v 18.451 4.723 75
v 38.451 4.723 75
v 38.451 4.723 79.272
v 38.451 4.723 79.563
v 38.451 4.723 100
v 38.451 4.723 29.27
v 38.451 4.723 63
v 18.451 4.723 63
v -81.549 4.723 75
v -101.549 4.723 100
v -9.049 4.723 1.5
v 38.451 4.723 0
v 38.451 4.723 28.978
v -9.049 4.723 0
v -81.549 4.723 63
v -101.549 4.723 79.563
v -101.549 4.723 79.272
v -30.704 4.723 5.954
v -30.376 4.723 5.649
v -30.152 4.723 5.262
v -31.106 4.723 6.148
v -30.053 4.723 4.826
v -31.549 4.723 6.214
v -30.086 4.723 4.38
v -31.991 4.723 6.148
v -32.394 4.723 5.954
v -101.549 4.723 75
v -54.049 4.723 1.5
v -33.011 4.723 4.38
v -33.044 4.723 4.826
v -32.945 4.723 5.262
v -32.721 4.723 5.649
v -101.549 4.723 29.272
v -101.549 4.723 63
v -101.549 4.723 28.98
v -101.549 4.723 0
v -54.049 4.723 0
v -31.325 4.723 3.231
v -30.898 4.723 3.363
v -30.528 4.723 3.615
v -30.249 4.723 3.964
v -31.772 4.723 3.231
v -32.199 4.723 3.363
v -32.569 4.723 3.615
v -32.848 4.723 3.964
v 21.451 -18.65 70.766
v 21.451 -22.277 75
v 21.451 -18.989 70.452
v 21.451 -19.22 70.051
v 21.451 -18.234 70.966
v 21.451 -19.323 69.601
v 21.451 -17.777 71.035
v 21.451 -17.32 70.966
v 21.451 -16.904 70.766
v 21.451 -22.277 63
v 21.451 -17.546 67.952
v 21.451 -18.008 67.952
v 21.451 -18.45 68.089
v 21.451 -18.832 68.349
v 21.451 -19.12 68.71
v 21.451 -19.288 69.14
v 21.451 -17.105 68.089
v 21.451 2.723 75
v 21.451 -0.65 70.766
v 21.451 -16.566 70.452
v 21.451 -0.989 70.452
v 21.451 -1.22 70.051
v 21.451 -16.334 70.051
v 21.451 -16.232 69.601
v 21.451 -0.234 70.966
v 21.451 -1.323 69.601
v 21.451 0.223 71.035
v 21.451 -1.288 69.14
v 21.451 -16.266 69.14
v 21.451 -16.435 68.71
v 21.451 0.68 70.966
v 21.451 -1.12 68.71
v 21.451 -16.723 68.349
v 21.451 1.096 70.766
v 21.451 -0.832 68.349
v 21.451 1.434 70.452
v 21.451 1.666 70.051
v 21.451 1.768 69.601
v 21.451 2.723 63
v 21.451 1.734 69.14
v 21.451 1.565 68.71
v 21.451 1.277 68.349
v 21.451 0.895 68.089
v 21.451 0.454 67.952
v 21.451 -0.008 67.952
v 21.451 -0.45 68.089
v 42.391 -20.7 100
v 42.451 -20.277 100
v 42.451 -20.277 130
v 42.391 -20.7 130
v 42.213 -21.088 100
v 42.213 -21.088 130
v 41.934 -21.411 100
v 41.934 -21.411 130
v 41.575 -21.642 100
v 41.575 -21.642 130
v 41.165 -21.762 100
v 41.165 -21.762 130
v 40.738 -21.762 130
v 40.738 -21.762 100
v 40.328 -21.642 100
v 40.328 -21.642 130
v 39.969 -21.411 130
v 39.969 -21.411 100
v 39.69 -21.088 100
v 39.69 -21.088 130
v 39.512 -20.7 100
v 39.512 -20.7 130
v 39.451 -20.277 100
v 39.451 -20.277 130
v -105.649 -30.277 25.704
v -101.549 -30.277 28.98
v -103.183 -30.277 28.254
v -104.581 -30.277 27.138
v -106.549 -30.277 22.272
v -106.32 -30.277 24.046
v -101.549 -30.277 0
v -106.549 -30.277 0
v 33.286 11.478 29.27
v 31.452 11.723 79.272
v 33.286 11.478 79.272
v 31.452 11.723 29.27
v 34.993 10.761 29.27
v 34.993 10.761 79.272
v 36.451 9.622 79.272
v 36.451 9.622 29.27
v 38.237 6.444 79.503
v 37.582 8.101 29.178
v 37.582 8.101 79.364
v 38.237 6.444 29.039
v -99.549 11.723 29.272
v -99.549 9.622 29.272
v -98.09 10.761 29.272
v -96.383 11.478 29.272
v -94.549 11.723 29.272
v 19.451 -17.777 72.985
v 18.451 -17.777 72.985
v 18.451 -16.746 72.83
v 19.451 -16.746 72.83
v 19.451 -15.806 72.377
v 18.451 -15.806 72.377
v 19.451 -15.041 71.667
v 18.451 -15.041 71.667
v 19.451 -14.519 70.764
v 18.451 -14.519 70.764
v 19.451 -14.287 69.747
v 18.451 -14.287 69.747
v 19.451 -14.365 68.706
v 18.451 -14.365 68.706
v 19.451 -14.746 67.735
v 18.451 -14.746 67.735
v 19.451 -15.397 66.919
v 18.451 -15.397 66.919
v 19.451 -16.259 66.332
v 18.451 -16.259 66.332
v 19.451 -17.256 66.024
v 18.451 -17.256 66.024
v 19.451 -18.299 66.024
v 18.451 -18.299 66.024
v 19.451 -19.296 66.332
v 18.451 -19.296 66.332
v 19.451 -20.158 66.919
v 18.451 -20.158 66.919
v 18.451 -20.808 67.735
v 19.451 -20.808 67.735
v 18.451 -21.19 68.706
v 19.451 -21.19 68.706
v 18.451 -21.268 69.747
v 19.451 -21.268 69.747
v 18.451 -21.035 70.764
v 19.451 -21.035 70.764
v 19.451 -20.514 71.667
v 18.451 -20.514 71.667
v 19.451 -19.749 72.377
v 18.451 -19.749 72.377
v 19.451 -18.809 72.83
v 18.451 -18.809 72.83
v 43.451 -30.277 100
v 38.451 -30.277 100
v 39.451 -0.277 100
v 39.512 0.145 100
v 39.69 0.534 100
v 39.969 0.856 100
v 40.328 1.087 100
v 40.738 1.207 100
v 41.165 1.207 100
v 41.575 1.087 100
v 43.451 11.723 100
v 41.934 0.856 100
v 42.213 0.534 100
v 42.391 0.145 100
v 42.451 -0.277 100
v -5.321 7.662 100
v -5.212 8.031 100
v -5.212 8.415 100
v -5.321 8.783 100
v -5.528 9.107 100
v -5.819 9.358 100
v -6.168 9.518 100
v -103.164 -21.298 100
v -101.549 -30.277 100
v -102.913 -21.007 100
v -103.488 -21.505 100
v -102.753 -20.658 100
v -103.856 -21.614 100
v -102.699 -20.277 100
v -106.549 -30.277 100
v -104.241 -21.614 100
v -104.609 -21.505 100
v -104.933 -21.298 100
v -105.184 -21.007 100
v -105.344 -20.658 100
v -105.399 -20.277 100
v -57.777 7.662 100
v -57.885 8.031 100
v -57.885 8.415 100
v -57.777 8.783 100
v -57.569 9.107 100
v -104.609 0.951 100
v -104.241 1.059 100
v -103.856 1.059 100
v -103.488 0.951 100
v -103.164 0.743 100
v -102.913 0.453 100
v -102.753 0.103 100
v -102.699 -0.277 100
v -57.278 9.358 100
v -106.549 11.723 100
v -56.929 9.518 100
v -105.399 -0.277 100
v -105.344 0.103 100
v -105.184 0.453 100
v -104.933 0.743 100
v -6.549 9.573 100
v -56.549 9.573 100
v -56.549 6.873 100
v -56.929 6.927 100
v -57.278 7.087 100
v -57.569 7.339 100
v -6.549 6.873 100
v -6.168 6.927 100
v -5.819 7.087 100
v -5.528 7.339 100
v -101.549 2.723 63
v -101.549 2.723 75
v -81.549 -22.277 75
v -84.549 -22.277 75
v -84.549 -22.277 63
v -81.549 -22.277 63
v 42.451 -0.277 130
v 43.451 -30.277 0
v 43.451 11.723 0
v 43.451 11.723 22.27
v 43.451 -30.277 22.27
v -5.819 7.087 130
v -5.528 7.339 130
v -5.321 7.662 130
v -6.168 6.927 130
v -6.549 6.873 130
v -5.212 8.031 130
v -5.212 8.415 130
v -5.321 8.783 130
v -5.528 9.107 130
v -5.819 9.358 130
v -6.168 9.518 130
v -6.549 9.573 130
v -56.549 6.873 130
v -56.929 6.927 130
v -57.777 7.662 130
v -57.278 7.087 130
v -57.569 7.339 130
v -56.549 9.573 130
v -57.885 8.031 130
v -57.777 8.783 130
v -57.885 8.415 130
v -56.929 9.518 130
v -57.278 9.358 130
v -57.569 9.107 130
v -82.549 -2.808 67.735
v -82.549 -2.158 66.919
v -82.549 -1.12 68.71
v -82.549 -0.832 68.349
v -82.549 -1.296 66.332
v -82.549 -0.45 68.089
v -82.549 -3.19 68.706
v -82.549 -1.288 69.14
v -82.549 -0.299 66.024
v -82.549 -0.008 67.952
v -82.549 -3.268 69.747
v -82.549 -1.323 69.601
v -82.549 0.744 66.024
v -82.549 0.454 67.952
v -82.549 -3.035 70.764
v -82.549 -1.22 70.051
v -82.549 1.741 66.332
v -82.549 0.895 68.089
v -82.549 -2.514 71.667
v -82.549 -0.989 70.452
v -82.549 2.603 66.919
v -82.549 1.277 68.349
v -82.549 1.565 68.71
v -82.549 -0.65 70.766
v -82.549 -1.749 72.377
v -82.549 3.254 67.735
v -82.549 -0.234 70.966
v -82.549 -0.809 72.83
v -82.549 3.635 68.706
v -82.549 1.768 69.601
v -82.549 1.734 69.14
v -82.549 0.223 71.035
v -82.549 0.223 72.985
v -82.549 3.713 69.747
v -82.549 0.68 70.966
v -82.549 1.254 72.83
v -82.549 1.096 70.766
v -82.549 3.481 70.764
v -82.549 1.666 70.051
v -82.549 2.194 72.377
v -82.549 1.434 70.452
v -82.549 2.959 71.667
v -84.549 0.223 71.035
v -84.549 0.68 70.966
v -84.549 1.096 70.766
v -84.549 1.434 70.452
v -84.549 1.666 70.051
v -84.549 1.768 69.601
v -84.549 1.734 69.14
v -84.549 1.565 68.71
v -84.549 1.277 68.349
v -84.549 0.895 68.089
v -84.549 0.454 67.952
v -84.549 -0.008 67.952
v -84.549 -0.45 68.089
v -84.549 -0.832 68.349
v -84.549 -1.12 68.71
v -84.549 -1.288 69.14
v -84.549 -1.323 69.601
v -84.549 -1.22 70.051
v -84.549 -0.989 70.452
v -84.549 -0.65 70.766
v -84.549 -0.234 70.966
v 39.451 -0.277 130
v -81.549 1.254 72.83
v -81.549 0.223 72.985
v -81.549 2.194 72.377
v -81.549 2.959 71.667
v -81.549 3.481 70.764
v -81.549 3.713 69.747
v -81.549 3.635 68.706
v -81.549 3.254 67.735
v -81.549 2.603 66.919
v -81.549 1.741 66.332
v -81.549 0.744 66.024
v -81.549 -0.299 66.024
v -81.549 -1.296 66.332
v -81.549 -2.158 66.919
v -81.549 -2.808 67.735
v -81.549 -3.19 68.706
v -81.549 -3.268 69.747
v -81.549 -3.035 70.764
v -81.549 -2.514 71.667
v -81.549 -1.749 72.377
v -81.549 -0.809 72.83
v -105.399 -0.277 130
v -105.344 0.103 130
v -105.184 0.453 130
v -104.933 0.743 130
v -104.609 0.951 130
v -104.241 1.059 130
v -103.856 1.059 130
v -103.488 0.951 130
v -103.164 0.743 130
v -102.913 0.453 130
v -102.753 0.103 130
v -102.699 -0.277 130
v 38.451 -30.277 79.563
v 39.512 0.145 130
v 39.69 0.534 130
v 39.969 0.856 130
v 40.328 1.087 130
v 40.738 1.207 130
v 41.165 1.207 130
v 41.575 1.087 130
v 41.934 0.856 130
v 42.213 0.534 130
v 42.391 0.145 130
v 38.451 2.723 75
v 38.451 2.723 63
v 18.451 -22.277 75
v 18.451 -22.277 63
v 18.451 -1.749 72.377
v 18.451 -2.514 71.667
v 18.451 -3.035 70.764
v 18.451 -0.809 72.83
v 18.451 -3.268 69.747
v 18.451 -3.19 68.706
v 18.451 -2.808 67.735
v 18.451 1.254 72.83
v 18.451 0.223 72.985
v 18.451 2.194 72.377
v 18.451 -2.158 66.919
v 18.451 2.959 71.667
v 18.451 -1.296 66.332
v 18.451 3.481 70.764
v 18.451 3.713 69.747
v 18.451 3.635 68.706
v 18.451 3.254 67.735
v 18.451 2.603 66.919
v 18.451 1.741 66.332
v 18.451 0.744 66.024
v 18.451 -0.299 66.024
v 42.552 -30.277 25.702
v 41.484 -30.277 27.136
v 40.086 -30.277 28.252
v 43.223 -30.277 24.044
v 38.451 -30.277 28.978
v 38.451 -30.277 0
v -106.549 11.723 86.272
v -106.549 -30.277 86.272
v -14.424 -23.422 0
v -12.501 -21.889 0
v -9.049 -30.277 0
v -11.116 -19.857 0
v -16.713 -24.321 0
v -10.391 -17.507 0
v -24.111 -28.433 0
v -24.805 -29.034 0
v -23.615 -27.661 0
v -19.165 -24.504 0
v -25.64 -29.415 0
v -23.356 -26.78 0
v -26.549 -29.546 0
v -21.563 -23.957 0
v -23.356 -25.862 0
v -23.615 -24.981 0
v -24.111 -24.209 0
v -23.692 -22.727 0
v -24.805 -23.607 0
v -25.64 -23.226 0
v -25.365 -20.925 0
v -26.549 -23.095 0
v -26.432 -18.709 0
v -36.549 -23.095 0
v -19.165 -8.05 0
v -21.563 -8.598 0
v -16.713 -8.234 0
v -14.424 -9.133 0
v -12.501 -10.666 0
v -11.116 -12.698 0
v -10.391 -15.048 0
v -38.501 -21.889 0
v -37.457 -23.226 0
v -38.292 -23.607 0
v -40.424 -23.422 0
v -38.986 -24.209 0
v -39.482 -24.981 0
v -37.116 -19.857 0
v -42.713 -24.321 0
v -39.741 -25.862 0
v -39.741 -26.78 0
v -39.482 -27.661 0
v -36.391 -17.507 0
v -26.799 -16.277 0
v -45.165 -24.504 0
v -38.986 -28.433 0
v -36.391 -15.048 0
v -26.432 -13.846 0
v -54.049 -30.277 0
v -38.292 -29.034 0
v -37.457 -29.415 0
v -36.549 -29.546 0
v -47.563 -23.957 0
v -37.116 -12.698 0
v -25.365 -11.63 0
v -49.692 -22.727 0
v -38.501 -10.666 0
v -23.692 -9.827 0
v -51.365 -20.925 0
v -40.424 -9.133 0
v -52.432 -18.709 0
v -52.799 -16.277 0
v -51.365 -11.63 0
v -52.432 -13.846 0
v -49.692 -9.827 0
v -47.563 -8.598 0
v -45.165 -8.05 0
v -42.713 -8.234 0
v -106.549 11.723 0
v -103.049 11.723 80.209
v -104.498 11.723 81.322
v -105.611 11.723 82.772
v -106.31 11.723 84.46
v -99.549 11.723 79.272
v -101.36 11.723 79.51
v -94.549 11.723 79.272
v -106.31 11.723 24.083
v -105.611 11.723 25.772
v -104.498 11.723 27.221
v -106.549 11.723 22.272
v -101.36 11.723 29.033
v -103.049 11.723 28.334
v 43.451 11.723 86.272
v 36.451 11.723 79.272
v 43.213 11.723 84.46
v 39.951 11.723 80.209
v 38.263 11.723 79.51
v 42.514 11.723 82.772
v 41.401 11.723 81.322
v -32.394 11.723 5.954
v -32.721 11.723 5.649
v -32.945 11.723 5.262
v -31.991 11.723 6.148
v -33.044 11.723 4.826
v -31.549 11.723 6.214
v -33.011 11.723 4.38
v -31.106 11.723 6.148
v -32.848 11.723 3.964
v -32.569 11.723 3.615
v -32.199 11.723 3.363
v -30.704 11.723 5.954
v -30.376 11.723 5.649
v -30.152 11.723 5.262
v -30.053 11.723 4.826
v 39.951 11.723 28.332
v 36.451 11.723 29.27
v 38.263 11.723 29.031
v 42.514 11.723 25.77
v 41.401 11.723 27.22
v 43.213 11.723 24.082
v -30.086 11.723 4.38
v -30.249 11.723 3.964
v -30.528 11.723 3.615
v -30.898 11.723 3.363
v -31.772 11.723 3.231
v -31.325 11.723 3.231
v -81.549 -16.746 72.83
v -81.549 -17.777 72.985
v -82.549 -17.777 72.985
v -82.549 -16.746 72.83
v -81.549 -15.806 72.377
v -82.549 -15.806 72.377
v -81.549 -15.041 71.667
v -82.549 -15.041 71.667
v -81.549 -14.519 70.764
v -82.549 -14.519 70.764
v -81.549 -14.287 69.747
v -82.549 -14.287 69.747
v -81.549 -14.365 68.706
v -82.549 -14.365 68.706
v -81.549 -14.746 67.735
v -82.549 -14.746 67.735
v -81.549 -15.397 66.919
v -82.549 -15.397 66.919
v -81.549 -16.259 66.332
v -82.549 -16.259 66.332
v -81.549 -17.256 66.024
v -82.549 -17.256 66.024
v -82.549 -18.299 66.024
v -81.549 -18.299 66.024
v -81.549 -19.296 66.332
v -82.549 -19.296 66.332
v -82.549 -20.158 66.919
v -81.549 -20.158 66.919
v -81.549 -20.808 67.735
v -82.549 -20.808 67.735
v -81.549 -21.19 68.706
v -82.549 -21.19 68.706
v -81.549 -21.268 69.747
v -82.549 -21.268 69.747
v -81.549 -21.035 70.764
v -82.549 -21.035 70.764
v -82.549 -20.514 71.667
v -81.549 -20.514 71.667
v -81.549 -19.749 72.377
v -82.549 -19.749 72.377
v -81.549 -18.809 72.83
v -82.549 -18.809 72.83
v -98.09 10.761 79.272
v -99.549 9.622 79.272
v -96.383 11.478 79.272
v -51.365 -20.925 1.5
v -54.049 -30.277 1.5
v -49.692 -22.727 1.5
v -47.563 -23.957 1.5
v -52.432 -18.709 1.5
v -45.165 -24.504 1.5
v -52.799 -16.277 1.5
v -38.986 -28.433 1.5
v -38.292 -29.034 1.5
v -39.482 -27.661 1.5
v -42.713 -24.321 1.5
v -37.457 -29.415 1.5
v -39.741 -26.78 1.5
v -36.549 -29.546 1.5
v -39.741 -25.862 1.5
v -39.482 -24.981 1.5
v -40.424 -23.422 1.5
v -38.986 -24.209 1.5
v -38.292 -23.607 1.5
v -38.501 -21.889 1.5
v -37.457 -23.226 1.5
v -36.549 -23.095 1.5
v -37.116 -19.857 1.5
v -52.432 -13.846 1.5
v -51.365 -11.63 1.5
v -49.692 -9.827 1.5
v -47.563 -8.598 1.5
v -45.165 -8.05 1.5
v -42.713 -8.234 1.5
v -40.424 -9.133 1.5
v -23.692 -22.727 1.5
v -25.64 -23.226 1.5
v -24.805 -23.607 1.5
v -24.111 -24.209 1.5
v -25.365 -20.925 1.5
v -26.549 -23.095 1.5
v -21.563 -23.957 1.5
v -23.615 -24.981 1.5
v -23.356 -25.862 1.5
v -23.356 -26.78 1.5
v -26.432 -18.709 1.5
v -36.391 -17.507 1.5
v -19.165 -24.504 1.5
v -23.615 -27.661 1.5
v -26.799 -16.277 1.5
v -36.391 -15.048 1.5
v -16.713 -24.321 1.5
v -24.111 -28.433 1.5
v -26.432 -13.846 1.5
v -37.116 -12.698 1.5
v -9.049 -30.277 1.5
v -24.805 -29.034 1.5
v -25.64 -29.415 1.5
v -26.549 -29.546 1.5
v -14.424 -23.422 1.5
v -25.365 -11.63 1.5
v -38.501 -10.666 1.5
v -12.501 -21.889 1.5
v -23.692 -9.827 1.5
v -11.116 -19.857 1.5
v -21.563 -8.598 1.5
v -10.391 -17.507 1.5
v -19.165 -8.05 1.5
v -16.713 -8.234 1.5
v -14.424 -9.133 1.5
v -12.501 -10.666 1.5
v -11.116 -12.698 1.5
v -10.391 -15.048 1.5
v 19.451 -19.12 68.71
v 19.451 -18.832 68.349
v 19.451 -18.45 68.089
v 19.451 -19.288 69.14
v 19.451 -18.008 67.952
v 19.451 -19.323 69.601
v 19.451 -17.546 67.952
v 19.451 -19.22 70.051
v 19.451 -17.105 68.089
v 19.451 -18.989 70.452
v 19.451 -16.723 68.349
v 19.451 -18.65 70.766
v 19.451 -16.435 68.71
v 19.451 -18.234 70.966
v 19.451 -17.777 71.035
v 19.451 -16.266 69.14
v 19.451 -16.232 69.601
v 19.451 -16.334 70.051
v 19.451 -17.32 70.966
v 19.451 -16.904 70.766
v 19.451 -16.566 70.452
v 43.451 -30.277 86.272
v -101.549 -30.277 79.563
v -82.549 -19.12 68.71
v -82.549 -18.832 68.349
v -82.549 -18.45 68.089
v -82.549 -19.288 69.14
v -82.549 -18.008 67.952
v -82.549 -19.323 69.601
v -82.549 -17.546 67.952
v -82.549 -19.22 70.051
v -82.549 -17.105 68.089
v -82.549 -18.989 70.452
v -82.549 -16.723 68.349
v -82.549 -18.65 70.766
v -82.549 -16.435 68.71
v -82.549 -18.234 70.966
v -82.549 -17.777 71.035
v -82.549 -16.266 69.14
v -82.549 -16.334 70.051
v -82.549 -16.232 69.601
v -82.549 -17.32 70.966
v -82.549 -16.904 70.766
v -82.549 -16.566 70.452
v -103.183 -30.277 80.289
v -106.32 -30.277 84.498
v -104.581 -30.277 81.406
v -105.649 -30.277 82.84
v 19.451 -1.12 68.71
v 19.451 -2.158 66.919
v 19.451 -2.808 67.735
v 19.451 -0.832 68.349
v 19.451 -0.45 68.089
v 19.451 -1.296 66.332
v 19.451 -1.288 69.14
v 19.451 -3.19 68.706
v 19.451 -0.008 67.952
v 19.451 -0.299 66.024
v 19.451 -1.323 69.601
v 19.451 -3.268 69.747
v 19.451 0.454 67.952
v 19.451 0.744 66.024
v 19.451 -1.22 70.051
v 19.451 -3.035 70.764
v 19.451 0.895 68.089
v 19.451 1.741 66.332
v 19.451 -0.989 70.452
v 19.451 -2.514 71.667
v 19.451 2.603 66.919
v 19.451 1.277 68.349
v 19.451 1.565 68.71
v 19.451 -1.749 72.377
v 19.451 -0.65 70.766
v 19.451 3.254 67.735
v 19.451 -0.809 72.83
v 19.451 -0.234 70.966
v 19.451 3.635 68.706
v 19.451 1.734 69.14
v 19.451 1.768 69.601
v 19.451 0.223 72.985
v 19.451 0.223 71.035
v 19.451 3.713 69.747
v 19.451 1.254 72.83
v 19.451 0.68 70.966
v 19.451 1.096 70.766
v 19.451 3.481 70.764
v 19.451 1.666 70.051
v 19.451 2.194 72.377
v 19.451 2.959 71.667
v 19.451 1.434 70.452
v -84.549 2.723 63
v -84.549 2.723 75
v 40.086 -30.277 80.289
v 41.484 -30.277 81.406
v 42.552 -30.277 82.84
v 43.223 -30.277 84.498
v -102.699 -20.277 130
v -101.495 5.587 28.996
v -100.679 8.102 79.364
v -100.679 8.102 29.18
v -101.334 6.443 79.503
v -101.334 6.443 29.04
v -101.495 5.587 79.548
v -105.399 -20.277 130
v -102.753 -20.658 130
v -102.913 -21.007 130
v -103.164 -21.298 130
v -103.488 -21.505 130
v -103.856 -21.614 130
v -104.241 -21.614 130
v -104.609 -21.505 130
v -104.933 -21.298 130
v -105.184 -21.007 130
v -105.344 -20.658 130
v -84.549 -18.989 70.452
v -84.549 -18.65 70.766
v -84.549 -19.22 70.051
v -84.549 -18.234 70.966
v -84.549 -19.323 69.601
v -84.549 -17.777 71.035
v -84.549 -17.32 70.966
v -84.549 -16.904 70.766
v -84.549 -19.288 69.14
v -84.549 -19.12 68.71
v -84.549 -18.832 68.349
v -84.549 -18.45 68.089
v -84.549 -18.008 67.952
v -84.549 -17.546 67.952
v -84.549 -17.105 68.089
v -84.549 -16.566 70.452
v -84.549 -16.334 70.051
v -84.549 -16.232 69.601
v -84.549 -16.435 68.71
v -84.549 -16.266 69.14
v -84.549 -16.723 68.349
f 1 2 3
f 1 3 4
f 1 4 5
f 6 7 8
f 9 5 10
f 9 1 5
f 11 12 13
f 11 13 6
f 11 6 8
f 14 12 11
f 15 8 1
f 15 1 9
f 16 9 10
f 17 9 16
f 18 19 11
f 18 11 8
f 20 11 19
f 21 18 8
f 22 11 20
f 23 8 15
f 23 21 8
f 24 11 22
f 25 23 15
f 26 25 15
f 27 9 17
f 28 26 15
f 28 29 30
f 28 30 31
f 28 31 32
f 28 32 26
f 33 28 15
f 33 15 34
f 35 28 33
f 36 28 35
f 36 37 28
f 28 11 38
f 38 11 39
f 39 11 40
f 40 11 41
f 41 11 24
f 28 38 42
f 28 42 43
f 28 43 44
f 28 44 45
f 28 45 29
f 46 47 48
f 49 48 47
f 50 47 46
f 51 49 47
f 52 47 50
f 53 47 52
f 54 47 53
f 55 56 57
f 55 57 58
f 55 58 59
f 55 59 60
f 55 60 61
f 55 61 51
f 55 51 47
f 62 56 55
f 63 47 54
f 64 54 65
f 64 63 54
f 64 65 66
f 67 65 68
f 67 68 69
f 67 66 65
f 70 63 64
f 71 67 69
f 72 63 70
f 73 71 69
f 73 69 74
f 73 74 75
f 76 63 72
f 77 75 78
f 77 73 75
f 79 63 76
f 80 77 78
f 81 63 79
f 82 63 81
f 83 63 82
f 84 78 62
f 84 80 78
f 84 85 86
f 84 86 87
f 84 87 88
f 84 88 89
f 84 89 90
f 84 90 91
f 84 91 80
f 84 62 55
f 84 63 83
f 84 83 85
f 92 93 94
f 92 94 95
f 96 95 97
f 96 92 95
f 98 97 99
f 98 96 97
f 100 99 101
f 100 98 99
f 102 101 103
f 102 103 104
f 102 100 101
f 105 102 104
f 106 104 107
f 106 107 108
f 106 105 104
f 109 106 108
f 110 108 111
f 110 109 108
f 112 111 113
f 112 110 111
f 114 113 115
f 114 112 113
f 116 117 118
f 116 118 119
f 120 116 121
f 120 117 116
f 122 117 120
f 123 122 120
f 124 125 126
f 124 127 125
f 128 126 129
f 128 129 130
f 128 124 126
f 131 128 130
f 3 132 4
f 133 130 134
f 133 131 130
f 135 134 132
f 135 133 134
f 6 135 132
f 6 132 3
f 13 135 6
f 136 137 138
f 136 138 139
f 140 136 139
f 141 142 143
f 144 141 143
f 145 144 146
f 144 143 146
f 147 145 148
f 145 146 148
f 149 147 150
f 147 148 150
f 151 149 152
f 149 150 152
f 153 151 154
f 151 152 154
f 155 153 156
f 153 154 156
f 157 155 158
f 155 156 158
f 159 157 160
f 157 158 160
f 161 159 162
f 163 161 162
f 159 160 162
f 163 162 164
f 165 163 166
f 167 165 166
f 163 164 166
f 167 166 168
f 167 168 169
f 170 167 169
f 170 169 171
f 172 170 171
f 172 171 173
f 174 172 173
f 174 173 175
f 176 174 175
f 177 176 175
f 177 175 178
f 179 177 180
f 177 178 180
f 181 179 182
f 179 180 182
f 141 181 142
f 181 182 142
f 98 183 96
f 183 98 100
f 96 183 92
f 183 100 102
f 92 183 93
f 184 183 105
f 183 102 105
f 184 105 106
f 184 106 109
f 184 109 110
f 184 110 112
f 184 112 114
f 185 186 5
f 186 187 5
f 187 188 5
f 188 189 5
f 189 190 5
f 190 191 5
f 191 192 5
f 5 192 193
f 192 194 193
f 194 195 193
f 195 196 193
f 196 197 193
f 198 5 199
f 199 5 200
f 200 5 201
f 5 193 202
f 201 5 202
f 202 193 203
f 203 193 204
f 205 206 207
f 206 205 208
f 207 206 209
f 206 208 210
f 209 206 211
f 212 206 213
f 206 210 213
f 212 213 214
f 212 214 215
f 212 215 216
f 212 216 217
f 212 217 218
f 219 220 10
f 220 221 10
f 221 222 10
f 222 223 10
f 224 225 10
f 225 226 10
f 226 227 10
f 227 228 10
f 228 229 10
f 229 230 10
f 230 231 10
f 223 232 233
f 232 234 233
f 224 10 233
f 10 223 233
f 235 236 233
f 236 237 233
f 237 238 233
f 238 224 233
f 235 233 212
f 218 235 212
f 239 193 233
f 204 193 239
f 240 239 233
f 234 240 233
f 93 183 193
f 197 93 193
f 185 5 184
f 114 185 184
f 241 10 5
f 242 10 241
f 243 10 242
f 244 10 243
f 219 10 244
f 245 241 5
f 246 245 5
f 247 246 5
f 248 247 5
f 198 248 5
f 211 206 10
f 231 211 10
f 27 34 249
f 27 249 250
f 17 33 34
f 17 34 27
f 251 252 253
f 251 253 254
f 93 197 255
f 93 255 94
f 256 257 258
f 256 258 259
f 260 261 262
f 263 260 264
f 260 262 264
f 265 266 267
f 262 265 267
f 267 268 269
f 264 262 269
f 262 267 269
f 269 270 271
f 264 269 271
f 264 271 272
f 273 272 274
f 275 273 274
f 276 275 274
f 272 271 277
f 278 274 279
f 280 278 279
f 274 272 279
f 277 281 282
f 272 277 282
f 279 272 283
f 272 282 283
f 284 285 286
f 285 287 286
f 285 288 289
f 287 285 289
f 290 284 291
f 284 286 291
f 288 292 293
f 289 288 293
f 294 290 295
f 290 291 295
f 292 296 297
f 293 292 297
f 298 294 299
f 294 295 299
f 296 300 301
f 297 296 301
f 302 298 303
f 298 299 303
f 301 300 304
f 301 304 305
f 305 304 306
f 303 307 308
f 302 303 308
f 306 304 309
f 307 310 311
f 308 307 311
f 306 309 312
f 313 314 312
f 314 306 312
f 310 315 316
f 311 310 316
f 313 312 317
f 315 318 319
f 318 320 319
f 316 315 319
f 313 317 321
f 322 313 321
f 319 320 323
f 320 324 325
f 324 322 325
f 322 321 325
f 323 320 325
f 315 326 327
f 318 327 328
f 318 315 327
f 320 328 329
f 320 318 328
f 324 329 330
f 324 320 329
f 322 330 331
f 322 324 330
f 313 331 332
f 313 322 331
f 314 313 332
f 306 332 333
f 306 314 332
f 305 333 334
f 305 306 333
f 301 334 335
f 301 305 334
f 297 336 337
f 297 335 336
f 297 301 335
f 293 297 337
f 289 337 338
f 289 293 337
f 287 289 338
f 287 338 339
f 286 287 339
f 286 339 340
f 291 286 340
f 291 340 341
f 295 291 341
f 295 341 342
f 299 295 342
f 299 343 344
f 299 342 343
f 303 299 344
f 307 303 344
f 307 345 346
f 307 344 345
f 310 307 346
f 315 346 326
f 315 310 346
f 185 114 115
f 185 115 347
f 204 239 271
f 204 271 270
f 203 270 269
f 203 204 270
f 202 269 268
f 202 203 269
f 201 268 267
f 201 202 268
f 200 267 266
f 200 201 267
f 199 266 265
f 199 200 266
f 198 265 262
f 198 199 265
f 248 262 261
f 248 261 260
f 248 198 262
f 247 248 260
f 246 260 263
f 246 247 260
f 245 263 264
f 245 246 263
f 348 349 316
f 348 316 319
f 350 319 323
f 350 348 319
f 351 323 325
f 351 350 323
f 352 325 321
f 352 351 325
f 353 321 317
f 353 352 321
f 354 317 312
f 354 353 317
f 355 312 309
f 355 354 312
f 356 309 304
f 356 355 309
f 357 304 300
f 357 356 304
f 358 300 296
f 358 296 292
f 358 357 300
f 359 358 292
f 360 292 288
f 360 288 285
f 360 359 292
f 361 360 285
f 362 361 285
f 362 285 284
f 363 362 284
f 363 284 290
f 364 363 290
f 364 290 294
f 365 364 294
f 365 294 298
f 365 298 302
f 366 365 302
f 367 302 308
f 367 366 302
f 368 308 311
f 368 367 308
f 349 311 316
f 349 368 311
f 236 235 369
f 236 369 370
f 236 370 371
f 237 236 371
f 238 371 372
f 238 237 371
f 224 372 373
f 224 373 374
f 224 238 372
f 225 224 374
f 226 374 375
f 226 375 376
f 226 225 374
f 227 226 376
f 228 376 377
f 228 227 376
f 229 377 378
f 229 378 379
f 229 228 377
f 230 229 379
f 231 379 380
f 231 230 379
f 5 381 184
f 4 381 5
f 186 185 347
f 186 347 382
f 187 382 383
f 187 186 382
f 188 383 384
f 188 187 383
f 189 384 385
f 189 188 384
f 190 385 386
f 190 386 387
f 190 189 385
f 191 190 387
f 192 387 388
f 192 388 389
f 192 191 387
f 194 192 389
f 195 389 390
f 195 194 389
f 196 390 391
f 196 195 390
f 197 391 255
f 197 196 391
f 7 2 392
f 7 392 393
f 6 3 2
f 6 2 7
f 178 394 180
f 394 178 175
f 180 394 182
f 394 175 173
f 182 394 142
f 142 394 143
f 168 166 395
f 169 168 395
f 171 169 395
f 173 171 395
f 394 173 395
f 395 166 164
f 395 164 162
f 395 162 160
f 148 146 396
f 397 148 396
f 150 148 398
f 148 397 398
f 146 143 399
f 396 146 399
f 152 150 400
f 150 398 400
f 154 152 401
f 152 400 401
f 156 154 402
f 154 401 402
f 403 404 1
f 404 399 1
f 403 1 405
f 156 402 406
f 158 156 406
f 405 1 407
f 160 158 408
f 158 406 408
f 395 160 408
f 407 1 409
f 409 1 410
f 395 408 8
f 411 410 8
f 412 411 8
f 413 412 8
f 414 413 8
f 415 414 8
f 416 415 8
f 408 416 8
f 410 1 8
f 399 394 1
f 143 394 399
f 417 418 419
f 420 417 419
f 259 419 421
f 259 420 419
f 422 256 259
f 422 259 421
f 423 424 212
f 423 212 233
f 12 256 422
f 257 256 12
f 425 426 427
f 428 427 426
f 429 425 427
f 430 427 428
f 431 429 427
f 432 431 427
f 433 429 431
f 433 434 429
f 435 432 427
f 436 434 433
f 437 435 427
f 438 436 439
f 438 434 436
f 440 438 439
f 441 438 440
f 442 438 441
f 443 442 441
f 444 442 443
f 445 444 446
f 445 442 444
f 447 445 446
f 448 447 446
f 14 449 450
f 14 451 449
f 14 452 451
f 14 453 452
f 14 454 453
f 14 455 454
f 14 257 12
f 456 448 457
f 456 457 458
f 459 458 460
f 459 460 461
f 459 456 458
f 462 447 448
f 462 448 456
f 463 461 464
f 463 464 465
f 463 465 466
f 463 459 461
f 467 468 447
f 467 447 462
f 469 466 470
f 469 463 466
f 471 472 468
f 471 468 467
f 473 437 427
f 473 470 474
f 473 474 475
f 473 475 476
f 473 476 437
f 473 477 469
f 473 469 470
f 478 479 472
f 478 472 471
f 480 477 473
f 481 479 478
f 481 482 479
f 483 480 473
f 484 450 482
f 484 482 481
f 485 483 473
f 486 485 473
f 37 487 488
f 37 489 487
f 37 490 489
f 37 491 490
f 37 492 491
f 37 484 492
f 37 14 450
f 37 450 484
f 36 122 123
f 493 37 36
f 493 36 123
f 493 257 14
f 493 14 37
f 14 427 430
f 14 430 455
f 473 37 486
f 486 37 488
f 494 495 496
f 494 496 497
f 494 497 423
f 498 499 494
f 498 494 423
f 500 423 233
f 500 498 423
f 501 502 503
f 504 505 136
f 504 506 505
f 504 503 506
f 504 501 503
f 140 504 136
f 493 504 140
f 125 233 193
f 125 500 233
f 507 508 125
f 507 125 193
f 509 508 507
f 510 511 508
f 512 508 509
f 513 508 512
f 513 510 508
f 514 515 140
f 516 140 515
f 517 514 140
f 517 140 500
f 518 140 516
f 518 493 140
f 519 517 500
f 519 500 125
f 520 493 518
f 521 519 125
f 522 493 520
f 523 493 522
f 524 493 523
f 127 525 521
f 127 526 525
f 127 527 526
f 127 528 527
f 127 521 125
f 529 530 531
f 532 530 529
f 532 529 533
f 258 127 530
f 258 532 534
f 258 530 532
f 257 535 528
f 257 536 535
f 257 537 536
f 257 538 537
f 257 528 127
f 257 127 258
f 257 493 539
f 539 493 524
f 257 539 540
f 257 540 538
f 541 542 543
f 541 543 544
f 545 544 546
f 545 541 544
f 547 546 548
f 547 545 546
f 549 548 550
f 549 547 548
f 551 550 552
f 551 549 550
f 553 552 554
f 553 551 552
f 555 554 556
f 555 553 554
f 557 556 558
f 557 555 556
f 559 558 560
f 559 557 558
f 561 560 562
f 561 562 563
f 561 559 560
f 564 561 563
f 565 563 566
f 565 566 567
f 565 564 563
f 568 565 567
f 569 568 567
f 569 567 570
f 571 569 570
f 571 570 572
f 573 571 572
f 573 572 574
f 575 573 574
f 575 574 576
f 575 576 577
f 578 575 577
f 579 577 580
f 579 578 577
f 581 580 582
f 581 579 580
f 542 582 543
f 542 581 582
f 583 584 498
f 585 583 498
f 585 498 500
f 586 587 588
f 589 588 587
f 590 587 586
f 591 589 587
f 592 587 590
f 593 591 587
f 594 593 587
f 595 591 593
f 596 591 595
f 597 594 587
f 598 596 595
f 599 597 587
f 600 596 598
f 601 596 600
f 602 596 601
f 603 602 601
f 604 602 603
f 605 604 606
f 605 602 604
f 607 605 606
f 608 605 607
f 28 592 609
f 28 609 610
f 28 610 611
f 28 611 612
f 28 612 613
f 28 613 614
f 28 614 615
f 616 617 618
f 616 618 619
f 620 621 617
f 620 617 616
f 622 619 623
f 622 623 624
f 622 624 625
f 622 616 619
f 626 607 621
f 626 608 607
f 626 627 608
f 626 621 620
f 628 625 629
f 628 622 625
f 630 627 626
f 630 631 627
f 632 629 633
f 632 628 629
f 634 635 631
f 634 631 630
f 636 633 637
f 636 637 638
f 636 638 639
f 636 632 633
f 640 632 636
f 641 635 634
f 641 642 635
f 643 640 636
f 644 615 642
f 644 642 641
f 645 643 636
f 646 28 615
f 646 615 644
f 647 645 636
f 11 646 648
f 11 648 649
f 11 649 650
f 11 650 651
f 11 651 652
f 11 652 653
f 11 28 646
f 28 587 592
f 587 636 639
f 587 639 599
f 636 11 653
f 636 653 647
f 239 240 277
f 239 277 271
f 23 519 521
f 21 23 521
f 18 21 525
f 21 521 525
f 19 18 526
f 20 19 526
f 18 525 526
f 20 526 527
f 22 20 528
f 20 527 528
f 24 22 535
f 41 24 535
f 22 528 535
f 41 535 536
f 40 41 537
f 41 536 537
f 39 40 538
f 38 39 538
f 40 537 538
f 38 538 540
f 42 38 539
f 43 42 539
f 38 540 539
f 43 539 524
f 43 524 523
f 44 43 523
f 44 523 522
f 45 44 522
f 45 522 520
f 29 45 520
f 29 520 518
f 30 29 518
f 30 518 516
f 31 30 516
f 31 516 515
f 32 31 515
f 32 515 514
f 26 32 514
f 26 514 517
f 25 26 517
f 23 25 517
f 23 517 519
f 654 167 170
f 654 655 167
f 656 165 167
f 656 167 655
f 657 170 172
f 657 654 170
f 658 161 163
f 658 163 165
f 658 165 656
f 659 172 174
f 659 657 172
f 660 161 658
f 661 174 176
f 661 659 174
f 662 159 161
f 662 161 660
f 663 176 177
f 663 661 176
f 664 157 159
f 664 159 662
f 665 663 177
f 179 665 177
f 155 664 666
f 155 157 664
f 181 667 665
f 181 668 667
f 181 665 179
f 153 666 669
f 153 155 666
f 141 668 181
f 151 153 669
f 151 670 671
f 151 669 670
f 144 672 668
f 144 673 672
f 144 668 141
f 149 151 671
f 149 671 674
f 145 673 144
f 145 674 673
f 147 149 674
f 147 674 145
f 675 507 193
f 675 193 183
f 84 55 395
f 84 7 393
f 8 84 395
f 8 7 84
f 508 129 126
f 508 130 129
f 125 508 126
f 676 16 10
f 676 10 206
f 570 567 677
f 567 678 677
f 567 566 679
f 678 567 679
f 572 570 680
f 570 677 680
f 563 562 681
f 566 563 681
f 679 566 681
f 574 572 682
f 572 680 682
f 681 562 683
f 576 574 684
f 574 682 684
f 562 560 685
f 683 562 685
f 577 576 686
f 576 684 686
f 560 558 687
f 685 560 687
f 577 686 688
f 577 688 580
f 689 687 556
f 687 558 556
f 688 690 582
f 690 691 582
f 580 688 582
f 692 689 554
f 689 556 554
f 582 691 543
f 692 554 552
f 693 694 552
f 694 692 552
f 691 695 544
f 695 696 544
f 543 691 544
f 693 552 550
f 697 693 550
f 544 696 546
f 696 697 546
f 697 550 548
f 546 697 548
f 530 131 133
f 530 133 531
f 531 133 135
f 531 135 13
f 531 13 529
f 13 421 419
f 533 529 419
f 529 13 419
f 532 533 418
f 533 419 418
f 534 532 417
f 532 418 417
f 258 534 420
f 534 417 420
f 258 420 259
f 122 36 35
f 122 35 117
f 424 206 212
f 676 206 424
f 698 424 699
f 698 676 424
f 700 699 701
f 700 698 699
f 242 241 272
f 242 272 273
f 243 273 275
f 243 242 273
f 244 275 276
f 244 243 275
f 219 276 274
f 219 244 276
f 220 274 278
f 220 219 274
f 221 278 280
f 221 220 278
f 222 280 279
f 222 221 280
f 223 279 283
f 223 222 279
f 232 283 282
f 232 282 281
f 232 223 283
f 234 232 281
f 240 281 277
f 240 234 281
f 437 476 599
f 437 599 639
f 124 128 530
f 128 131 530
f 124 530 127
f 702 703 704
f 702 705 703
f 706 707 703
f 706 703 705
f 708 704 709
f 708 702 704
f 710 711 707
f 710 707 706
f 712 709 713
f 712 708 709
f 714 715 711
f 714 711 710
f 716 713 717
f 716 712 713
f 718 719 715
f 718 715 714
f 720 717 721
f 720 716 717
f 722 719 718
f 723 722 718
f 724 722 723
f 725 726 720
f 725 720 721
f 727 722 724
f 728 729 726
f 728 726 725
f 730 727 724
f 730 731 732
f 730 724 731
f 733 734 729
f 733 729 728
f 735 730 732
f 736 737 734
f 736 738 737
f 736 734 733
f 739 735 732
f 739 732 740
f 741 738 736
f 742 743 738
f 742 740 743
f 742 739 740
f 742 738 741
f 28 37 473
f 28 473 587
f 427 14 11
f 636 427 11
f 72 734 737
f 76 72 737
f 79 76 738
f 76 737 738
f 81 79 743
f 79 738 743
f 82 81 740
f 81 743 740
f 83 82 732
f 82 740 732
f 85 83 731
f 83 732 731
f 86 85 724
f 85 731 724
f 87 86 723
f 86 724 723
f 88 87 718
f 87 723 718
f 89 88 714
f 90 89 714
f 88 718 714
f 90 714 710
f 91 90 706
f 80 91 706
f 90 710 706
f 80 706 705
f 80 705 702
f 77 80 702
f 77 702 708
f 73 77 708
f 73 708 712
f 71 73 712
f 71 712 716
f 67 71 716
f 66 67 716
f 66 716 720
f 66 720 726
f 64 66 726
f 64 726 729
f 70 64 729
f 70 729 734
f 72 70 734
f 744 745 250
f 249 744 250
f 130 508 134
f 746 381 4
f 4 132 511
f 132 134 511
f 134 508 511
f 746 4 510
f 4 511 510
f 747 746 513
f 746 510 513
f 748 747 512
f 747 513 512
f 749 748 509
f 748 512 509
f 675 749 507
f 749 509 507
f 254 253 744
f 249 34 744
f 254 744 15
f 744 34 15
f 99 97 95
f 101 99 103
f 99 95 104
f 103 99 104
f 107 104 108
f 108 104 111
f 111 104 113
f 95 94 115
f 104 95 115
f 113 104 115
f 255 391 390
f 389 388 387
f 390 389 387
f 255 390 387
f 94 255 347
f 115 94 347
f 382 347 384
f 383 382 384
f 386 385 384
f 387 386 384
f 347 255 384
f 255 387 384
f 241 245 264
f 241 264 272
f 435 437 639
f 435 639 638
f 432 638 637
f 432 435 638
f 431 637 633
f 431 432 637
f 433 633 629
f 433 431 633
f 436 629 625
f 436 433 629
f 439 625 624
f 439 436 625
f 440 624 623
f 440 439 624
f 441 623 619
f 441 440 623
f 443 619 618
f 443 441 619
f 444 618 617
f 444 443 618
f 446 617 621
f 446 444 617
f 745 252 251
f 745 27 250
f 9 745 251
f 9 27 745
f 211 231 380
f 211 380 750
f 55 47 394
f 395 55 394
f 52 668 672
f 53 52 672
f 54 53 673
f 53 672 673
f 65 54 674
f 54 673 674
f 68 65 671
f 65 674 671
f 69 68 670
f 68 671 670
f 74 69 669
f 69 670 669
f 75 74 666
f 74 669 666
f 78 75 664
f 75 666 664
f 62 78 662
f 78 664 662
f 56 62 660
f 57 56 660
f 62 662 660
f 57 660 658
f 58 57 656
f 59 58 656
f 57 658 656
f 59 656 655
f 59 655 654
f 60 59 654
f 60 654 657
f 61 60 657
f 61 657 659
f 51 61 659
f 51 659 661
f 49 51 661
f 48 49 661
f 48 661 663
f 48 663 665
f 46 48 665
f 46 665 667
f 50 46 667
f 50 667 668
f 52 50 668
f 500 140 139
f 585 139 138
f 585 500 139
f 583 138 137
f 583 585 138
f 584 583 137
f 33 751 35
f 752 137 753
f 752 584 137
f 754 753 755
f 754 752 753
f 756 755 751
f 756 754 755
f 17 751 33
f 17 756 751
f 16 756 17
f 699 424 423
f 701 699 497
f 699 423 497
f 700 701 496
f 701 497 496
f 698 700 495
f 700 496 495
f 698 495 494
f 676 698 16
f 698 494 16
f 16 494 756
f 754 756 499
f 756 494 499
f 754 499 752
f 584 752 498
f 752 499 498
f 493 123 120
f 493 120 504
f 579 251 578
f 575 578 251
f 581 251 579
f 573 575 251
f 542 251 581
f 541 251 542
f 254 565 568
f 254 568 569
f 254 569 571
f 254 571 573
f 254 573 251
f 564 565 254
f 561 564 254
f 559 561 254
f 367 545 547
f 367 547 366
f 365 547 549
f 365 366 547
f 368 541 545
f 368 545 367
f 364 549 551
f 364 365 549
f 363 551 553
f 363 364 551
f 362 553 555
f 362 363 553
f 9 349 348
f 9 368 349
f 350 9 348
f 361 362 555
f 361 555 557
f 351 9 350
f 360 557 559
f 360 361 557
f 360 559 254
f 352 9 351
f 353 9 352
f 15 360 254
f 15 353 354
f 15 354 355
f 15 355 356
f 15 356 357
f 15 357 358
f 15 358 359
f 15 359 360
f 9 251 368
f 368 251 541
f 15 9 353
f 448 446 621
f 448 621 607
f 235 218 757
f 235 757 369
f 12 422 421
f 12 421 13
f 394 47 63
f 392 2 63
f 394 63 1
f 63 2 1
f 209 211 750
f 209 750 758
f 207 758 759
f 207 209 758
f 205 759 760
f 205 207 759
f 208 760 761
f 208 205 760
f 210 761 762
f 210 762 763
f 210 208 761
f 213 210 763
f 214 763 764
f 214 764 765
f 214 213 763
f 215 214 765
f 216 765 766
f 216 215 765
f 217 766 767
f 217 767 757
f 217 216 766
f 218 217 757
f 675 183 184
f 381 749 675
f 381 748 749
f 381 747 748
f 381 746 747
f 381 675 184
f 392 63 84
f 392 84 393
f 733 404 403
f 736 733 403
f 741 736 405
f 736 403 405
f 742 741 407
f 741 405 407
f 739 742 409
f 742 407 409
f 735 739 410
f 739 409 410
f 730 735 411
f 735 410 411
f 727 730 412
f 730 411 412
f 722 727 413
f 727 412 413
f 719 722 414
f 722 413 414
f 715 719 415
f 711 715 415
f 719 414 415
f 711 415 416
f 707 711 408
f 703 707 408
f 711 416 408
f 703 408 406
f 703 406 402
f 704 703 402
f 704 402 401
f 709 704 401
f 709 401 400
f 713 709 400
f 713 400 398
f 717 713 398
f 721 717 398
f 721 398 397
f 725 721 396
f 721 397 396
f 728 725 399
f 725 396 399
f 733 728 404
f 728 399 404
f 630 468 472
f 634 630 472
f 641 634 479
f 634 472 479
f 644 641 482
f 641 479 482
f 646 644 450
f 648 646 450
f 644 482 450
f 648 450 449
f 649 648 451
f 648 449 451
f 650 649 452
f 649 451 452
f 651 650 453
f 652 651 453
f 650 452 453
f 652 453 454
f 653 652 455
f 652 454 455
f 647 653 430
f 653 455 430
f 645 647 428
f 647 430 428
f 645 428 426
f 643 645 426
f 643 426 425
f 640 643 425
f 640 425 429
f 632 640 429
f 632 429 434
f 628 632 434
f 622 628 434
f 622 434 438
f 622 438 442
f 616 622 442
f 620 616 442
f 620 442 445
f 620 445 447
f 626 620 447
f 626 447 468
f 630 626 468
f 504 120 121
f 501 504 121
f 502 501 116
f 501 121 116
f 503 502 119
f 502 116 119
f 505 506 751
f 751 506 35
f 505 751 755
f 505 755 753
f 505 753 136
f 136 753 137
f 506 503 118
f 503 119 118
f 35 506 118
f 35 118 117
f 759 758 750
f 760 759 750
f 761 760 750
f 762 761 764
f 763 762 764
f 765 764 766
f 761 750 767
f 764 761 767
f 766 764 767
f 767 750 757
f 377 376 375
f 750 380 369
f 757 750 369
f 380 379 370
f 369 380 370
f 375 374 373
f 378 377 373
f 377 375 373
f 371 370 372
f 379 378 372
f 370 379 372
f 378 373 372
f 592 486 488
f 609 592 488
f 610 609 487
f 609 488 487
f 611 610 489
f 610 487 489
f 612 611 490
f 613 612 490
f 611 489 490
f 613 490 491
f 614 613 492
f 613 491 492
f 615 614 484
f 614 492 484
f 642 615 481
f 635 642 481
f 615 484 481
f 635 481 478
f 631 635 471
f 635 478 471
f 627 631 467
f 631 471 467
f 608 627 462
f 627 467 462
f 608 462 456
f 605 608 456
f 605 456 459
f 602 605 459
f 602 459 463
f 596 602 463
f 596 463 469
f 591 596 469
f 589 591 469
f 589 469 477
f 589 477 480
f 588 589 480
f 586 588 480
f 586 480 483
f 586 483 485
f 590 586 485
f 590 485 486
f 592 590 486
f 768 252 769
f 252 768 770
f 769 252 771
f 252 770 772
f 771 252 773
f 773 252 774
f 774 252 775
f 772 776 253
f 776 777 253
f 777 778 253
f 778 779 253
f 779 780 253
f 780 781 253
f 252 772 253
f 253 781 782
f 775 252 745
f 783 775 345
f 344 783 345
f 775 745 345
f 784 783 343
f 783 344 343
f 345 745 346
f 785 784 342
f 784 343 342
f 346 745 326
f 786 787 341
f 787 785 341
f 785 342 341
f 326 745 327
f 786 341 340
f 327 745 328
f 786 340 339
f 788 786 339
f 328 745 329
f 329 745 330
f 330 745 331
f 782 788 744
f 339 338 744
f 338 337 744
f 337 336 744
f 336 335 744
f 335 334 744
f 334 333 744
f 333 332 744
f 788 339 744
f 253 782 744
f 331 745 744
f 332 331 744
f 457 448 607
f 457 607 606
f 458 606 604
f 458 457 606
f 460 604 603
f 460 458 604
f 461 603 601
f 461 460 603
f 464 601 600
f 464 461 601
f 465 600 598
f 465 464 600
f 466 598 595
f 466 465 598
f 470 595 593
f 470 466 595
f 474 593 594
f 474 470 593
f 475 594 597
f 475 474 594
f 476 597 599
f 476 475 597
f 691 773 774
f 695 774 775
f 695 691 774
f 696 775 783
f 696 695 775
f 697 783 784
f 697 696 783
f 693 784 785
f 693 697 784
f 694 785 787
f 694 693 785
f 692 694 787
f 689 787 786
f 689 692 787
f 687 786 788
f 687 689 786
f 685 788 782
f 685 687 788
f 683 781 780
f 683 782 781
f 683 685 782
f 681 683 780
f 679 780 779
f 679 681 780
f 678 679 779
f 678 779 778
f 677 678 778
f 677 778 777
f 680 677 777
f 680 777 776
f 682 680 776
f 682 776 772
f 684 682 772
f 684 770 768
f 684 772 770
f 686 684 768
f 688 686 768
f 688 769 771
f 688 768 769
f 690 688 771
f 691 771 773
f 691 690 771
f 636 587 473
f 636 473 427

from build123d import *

# Parameters (mm, degrees)
BOSS_EXTRUDE2_DEPTH = 100
BOSS_EXTRUDE3_DEPTH = 30
SKETCH10_R          = 7.5
CUT_EXTRUDE2_DEPTH  = 210
SKETCH15_R          = 1.5
CUT_EXTRUDE3_DEPTH  = 10
SKETCH16_W          = 20
SKETCH16_H          = 12
BOSS_EXTRUDE5_DEPTH = 2
SKETCH17_W          = 3
SKETCH17_H          = 12
BOSS_EXTRUDE6_DEPTH = 25
SKETCH19_R          = 3.5
CUT_EXTRUDE4_DEPTH  = 1
SKETCH20_R          = 1.55
CUT_EXTRUDE5_DEPTH  = 3
SKETCH21_W          = 45
SKETCH21_H          = 1.5
BOSS_EXTRUDE7_DEPTH = 35
SKETCH23_R          = 8.25
CUT_EXTRUDE6_DEPTH  = 40
CUT_EXTRUDE7_DEPTH  = 40
SKETCH26_W          = 50
SKETCH26_H          = 42
CUT_EXTRUDE8_DEPTH  = 5
FILLET1_R           = 7
FILLET3_R           = 7
FILLET4_R           = 7
SKETCH27_W          = 50.001655339
SKETCH27_H          = 42
CUT_EXTRUDE9_DEPTH  = 5
FILLET5_R           = 7
FILLET6_R           = 7
FILLET7_R           = 7


# Some blends are built 0.0001 mm under size
with BuildPart() as part:
    # Sketch3 → Boss-Extrude2 (new body)
    with BuildSketch(Plane.XY):
        Polygon((-106.54853621, -30.277349769), (-106.54853621, 11.722650231), (43.45146379, 11.722650231), (43.45146379, -30.277349769), (38.45146379, -30.277349769), (38.45146379, 4.722650231), (-101.54853621, 4.722650231), (-101.54853621, -30.277349769), align=None)
    extrude(amount=BOSS_EXTRUDE2_DEPTH)

    # Sketch4 → Boss-Extrude3 (add)
    with BuildSketch(Plane.XY.offset(100)):
        with BuildLine():
            Line((-102.69853621, -0.277349769), (-102.69853621, -20.277349769))
            ThreePointArc((-102.69853621, -20.277349769), (-104.04853621, -21.627349769), (-105.39853621, -20.277349769))
            Line((-105.39853621, -20.277349769), (-105.39853621, -0.277349769))
            ThreePointArc((-105.39853621, -0.277349769), (-104.04853621, 1.072650231), (-102.69853621, -0.277349769))
        make_face()
        with BuildLine():
            Line((-56.54853621, 9.572650231), (-6.54853621, 9.572650231))
            ThreePointArc((-6.54853621, 9.572650231), (-5.19853621, 8.222650231), (-6.54853621, 6.872650231))
            Line((-6.54853621, 6.872650231), (-56.54853621, 6.872650231))
            ThreePointArc((-56.54853621, 6.872650231), (-57.89853621, 8.222650231), (-56.54853621, 9.572650231))
        make_face()
        with BuildLine():
            Line((42.45146379, -0.277349769), (42.45146379, -20.277349769))
            ThreePointArc((42.45146379, -20.277349769), (40.95146379, -21.777349769), (39.45146379, -20.277349769))
            Line((39.45146379, -20.277349769), (39.45146379, -0.277349769))
            ThreePointArc((39.45146379, -0.277349769), (40.95146379, 1.222650231), (42.45146379, -0.277349769))
        make_face()
    extrude(amount=BOSS_EXTRUDE3_DEPTH)

    # Sketch10 → Cut-Extrude2 (cut)
    with BuildSketch(Plane(origin=(43.45146379, 0, 0), x_dir=(0, 0, -1), z_dir=(1, 0, 0))):
        with Locations((-45, -8.277349769)):
            Circle(SKETCH10_R)
    extrude(amount=-CUT_EXTRUDE2_DEPTH, mode=Mode.SUBTRACT)

    # Sketch15 → Cut-Extrude3 (cut)
    with BuildSketch(Plane(origin=(0, 11.722650231, 0), x_dir=(1, 0, 0), z_dir=(0, 1, 0))):
        with Locations(Location((-31.54853621, -4.714245873, 0), (0, 0, 270))):
            Circle(SKETCH15_R)
    extrude(amount=-CUT_EXTRUDE3_DEPTH, mode=Mode.SUBTRACT)

    # Sketch16 → Boss-Extrude5 (add)
    with BuildSketch(Plane.XZ.offset(-4.722650231)):
        with Locations((28.45146379, 69)):
            Rectangle(SKETCH16_W, SKETCH16_H)
    boss_extrude5 = extrude(amount=BOSS_EXTRUDE5_DEPTH)

    # Sketch17 → Boss-Extrude6 (add)
    with BuildSketch(Plane(origin=(0, 2.722650231, 0), x_dir=(-1, 0, 0), z_dir=(0, -1, 0))):
        with Locations((-19.95146379, -69)):
            Rectangle(SKETCH17_W, SKETCH17_H)
    boss_extrude6 = extrude(amount=BOSS_EXTRUDE6_DEPTH)

    # Sketch19 → Cut-Extrude4 (cut)
    with BuildSketch(Plane.ZY.offset(-18.45146379)):
        with Locations((69.485133357, 0.222650231)):
            Circle(SKETCH19_R)
        with Locations((69.485133357, -17.777349769)):
            Circle(SKETCH19_R)
    cut_extrude4 = extrude(amount=-CUT_EXTRUDE4_DEPTH, mode=Mode.SUBTRACT)

    # Sketch20 → Cut-Extrude5 (cut)
    with BuildSketch(Plane.ZY.offset(-19.45146379)):
        with Locations((69.485133357, 0.222650231)):
            Circle(SKETCH20_R)
        with Locations((69.485133357, -17.777349769)):
            Circle(SKETCH20_R)
    cut_extrude5 = extrude(amount=-CUT_EXTRUDE5_DEPTH, mode=Mode.SUBTRACT)

    # Mirror6: Boss-Extrude5, Boss-Extrude6, Cut-Extrude4, Cut-Extrude5 across plane
    add(boss_extrude5.mirror(Plane.ZY.offset(31.54853621)))
    add(boss_extrude6.mirror(Plane.ZY.offset(31.54853621)))
    add(cut_extrude4.mirror(Plane.ZY.offset(31.54853621)), mode=Mode.SUBTRACT)
    add(cut_extrude5.mirror(Plane.ZY.offset(31.54853621)), mode=Mode.SUBTRACT)

    # Sketch21 → Boss-Extrude7 (add)
    with BuildSketch(Plane.XZ.offset(-4.722650231)):
        with Locations((-31.54853621, 0.75)):
            Rectangle(SKETCH21_W, SKETCH21_H)
    extrude(amount=BOSS_EXTRUDE7_DEPTH)

    # Sketch23 → Cut-Extrude6 (cut)
    with BuildSketch(Plane(origin=(0, 0, 0), x_dir=(-1, 0, 0), z_dir=(0, 0, -1))):
        with Locations((44.54853621, -16.277349769)):
            Circle(SKETCH23_R)
        with Locations((18.54853621, -16.277349769)):
            Circle(SKETCH23_R)
    extrude(amount=-CUT_EXTRUDE6_DEPTH, mode=Mode.SUBTRACT)

    # Sketch24 → Cut-Extrude7 (cut)
    with BuildSketch(Plane(origin=(0, 0, 0), x_dir=(-1, 0, 0), z_dir=(0, 0, -1))):
        with BuildLine():
            Line((26.54853621, -23.095326639), (36.54853621, -23.095326639))
            ThreePointArc((36.54853621, -23.095326639), (39.773941895, -26.320732325), (36.54853621, -29.54613801))
            Line((36.54853621, -29.54613801), (26.54853621, -29.54613801))
            ThreePointArc((26.54853621, -29.54613801), (23.323130524, -26.320732325), (26.54853621, -23.095326639))
        make_face()
    extrude(amount=-CUT_EXTRUDE7_DEPTH, mode=Mode.SUBTRACT)

    # Sketch26 → Cut-Extrude8 (cut)
    with BuildSketch(Plane.ZY.offset(106.54853621)):
        with Locations((54.271655339, -9.277349769)):
            Rectangle(SKETCH26_W, SKETCH26_H)
    extrude(amount=-CUT_EXTRUDE8_DEPTH, mode=Mode.SUBTRACT)

    # Fillet1
    fillet1_edges = [part.edges().sort_by_distance(p)[0] for p in [
        (-101.54853621, 11.722650231, 54.271655339),
    ]]
    fillet(fillet1_edges, radius=FILLET1_R - 0.0001)  # a hair under: the kernel refuses the full size

    # Fillet3
    # the kernel refuses this fillet: 7 mm, written as the material it takes off along each edge
    with BuildSketch(Plane(origin=(-106.54853621, -47.777349769, 29.271655339), x_dir=(0, 0, -1), z_dir=(0, 1, 0))) as fillet3_piece_1_section:
        with BuildLine():
            CenterArc((FILLET3_R, -FILLET3_R), FILLET3_R, 90, 90)
            Line((0, -FILLET3_R), (0, 0))
            Line((0, 0), (FILLET3_R, 0))
        make_face()
    fillet3_piece_1 = extrude(amount=77, mode=Mode.PRIVATE)
    fillet3_piece_1 = fillet3_piece_1 - Plane(origin=(-94.54863621, 4.722750231, 27.624323614), x_dir=(0, 1, 0), z_dir=(0, 0, 1)) * Cylinder(6.9999, 182, mode=Mode.PRIVATE)
    add(fillet3_piece_1, mode=Mode.SUBTRACT)

    # Fillet4
    # the kernel refuses this fillet: 7 mm, written as the material it takes off along each edge
    with BuildSketch(Plane(origin=(-106.54853621, 29.222650231, 79.271655339), x_dir=(0, 0, 1), z_dir=(0, -1, 0))) as fillet4_piece_1_section:
        with BuildLine():
            CenterArc((FILLET4_R, -FILLET4_R), FILLET4_R, 90, 90)
            Line((0, -FILLET4_R), (0, 0))
            Line((0, 0), (FILLET4_R, 0))
        make_face()
    fillet4_piece_1 = extrude(amount=77, mode=Mode.PRIVATE)
    fillet4_piece_1 = fillet4_piece_1 - Plane(origin=(-94.54863621, 4.722750231, 80.918987064), x_dir=(0, 1, 0), z_dir=(0, 0, 1)) * Cylinder(6.9999, 182, mode=Mode.PRIVATE)
    add(fillet4_piece_1, mode=Mode.SUBTRACT)

    # Sketch27 → Cut-Extrude9 (cut)
    with BuildSketch(Plane(origin=(43.45146379, 0, 0), x_dir=(0, 0, -1), z_dir=(1, 0, 0))):
        with Locations((-54.27082767, -9.277349769)):
            Rectangle(SKETCH27_W, SKETCH27_H)
    extrude(amount=-CUT_EXTRUDE9_DEPTH, mode=Mode.SUBTRACT)

    # Fillet5
    fillet5_edges = [part.edges().sort_by_distance(p)[0] for p in [
        (38.45146379, 11.722650231, 54.270827669),
    ]]
    fillet(fillet5_edges, radius=FILLET5_R - 0.0001)  # a hair under: the kernel refuses the full size

    # Fillet6
    # the kernel refuses this fillet: 7 mm, written as the material it takes off along each edge
    with BuildSketch(Plane(origin=(43.45146379, -47.777349769, 29.27), x_dir=(0, 0, -1), z_dir=(0, 1, 0))) as fillet6_piece_1_section:
        with BuildLine():
            CenterArc((FILLET6_R, FILLET6_R), FILLET6_R, 180, 90)
            Line((0, FILLET6_R), (0, 0))
            Line((0, 0), (FILLET6_R, 0))
        make_face()
    fillet6_piece_1 = extrude(amount=77, mode=Mode.PRIVATE)
    fillet6_piece_1 = fillet6_piece_1 - Plane(origin=(31.45156379, 4.722750231, 27.622668275), x_dir=(0, 1, 0), z_dir=(0, 0, 1)) * Cylinder(6.9999, 182, mode=Mode.PRIVATE)
    add(fillet6_piece_1, mode=Mode.SUBTRACT)

    # Fillet7
    # the kernel refuses this fillet: 7 mm, written as the material it takes off along each edge
    with BuildSketch(Plane(origin=(43.45146379, 29.222650231, 79.271655339), x_dir=(-1, 0, 0), z_dir=(0, -1, 0))) as fillet7_piece_1_section:
        with BuildLine():
            CenterArc((FILLET7_R, -FILLET7_R), FILLET7_R, 90, 90)
            Line((0, -FILLET7_R), (0, 0))
            Line((0, 0), (FILLET7_R, 0))
        make_face()
    fillet7_piece_1 = extrude(amount=77, mode=Mode.PRIVATE)
    fillet7_piece_1 = fillet7_piece_1 - Plane(origin=(31.45156379, 4.722750231, 79.268302474), x_dir=(0, 1, 0), z_dir=(0, 0, 1)) * Cylinder(6.9999, 183, mode=Mode.PRIVATE)
    add(fillet7_piece_1, mode=Mode.SUBTRACT)


solid = part.part
